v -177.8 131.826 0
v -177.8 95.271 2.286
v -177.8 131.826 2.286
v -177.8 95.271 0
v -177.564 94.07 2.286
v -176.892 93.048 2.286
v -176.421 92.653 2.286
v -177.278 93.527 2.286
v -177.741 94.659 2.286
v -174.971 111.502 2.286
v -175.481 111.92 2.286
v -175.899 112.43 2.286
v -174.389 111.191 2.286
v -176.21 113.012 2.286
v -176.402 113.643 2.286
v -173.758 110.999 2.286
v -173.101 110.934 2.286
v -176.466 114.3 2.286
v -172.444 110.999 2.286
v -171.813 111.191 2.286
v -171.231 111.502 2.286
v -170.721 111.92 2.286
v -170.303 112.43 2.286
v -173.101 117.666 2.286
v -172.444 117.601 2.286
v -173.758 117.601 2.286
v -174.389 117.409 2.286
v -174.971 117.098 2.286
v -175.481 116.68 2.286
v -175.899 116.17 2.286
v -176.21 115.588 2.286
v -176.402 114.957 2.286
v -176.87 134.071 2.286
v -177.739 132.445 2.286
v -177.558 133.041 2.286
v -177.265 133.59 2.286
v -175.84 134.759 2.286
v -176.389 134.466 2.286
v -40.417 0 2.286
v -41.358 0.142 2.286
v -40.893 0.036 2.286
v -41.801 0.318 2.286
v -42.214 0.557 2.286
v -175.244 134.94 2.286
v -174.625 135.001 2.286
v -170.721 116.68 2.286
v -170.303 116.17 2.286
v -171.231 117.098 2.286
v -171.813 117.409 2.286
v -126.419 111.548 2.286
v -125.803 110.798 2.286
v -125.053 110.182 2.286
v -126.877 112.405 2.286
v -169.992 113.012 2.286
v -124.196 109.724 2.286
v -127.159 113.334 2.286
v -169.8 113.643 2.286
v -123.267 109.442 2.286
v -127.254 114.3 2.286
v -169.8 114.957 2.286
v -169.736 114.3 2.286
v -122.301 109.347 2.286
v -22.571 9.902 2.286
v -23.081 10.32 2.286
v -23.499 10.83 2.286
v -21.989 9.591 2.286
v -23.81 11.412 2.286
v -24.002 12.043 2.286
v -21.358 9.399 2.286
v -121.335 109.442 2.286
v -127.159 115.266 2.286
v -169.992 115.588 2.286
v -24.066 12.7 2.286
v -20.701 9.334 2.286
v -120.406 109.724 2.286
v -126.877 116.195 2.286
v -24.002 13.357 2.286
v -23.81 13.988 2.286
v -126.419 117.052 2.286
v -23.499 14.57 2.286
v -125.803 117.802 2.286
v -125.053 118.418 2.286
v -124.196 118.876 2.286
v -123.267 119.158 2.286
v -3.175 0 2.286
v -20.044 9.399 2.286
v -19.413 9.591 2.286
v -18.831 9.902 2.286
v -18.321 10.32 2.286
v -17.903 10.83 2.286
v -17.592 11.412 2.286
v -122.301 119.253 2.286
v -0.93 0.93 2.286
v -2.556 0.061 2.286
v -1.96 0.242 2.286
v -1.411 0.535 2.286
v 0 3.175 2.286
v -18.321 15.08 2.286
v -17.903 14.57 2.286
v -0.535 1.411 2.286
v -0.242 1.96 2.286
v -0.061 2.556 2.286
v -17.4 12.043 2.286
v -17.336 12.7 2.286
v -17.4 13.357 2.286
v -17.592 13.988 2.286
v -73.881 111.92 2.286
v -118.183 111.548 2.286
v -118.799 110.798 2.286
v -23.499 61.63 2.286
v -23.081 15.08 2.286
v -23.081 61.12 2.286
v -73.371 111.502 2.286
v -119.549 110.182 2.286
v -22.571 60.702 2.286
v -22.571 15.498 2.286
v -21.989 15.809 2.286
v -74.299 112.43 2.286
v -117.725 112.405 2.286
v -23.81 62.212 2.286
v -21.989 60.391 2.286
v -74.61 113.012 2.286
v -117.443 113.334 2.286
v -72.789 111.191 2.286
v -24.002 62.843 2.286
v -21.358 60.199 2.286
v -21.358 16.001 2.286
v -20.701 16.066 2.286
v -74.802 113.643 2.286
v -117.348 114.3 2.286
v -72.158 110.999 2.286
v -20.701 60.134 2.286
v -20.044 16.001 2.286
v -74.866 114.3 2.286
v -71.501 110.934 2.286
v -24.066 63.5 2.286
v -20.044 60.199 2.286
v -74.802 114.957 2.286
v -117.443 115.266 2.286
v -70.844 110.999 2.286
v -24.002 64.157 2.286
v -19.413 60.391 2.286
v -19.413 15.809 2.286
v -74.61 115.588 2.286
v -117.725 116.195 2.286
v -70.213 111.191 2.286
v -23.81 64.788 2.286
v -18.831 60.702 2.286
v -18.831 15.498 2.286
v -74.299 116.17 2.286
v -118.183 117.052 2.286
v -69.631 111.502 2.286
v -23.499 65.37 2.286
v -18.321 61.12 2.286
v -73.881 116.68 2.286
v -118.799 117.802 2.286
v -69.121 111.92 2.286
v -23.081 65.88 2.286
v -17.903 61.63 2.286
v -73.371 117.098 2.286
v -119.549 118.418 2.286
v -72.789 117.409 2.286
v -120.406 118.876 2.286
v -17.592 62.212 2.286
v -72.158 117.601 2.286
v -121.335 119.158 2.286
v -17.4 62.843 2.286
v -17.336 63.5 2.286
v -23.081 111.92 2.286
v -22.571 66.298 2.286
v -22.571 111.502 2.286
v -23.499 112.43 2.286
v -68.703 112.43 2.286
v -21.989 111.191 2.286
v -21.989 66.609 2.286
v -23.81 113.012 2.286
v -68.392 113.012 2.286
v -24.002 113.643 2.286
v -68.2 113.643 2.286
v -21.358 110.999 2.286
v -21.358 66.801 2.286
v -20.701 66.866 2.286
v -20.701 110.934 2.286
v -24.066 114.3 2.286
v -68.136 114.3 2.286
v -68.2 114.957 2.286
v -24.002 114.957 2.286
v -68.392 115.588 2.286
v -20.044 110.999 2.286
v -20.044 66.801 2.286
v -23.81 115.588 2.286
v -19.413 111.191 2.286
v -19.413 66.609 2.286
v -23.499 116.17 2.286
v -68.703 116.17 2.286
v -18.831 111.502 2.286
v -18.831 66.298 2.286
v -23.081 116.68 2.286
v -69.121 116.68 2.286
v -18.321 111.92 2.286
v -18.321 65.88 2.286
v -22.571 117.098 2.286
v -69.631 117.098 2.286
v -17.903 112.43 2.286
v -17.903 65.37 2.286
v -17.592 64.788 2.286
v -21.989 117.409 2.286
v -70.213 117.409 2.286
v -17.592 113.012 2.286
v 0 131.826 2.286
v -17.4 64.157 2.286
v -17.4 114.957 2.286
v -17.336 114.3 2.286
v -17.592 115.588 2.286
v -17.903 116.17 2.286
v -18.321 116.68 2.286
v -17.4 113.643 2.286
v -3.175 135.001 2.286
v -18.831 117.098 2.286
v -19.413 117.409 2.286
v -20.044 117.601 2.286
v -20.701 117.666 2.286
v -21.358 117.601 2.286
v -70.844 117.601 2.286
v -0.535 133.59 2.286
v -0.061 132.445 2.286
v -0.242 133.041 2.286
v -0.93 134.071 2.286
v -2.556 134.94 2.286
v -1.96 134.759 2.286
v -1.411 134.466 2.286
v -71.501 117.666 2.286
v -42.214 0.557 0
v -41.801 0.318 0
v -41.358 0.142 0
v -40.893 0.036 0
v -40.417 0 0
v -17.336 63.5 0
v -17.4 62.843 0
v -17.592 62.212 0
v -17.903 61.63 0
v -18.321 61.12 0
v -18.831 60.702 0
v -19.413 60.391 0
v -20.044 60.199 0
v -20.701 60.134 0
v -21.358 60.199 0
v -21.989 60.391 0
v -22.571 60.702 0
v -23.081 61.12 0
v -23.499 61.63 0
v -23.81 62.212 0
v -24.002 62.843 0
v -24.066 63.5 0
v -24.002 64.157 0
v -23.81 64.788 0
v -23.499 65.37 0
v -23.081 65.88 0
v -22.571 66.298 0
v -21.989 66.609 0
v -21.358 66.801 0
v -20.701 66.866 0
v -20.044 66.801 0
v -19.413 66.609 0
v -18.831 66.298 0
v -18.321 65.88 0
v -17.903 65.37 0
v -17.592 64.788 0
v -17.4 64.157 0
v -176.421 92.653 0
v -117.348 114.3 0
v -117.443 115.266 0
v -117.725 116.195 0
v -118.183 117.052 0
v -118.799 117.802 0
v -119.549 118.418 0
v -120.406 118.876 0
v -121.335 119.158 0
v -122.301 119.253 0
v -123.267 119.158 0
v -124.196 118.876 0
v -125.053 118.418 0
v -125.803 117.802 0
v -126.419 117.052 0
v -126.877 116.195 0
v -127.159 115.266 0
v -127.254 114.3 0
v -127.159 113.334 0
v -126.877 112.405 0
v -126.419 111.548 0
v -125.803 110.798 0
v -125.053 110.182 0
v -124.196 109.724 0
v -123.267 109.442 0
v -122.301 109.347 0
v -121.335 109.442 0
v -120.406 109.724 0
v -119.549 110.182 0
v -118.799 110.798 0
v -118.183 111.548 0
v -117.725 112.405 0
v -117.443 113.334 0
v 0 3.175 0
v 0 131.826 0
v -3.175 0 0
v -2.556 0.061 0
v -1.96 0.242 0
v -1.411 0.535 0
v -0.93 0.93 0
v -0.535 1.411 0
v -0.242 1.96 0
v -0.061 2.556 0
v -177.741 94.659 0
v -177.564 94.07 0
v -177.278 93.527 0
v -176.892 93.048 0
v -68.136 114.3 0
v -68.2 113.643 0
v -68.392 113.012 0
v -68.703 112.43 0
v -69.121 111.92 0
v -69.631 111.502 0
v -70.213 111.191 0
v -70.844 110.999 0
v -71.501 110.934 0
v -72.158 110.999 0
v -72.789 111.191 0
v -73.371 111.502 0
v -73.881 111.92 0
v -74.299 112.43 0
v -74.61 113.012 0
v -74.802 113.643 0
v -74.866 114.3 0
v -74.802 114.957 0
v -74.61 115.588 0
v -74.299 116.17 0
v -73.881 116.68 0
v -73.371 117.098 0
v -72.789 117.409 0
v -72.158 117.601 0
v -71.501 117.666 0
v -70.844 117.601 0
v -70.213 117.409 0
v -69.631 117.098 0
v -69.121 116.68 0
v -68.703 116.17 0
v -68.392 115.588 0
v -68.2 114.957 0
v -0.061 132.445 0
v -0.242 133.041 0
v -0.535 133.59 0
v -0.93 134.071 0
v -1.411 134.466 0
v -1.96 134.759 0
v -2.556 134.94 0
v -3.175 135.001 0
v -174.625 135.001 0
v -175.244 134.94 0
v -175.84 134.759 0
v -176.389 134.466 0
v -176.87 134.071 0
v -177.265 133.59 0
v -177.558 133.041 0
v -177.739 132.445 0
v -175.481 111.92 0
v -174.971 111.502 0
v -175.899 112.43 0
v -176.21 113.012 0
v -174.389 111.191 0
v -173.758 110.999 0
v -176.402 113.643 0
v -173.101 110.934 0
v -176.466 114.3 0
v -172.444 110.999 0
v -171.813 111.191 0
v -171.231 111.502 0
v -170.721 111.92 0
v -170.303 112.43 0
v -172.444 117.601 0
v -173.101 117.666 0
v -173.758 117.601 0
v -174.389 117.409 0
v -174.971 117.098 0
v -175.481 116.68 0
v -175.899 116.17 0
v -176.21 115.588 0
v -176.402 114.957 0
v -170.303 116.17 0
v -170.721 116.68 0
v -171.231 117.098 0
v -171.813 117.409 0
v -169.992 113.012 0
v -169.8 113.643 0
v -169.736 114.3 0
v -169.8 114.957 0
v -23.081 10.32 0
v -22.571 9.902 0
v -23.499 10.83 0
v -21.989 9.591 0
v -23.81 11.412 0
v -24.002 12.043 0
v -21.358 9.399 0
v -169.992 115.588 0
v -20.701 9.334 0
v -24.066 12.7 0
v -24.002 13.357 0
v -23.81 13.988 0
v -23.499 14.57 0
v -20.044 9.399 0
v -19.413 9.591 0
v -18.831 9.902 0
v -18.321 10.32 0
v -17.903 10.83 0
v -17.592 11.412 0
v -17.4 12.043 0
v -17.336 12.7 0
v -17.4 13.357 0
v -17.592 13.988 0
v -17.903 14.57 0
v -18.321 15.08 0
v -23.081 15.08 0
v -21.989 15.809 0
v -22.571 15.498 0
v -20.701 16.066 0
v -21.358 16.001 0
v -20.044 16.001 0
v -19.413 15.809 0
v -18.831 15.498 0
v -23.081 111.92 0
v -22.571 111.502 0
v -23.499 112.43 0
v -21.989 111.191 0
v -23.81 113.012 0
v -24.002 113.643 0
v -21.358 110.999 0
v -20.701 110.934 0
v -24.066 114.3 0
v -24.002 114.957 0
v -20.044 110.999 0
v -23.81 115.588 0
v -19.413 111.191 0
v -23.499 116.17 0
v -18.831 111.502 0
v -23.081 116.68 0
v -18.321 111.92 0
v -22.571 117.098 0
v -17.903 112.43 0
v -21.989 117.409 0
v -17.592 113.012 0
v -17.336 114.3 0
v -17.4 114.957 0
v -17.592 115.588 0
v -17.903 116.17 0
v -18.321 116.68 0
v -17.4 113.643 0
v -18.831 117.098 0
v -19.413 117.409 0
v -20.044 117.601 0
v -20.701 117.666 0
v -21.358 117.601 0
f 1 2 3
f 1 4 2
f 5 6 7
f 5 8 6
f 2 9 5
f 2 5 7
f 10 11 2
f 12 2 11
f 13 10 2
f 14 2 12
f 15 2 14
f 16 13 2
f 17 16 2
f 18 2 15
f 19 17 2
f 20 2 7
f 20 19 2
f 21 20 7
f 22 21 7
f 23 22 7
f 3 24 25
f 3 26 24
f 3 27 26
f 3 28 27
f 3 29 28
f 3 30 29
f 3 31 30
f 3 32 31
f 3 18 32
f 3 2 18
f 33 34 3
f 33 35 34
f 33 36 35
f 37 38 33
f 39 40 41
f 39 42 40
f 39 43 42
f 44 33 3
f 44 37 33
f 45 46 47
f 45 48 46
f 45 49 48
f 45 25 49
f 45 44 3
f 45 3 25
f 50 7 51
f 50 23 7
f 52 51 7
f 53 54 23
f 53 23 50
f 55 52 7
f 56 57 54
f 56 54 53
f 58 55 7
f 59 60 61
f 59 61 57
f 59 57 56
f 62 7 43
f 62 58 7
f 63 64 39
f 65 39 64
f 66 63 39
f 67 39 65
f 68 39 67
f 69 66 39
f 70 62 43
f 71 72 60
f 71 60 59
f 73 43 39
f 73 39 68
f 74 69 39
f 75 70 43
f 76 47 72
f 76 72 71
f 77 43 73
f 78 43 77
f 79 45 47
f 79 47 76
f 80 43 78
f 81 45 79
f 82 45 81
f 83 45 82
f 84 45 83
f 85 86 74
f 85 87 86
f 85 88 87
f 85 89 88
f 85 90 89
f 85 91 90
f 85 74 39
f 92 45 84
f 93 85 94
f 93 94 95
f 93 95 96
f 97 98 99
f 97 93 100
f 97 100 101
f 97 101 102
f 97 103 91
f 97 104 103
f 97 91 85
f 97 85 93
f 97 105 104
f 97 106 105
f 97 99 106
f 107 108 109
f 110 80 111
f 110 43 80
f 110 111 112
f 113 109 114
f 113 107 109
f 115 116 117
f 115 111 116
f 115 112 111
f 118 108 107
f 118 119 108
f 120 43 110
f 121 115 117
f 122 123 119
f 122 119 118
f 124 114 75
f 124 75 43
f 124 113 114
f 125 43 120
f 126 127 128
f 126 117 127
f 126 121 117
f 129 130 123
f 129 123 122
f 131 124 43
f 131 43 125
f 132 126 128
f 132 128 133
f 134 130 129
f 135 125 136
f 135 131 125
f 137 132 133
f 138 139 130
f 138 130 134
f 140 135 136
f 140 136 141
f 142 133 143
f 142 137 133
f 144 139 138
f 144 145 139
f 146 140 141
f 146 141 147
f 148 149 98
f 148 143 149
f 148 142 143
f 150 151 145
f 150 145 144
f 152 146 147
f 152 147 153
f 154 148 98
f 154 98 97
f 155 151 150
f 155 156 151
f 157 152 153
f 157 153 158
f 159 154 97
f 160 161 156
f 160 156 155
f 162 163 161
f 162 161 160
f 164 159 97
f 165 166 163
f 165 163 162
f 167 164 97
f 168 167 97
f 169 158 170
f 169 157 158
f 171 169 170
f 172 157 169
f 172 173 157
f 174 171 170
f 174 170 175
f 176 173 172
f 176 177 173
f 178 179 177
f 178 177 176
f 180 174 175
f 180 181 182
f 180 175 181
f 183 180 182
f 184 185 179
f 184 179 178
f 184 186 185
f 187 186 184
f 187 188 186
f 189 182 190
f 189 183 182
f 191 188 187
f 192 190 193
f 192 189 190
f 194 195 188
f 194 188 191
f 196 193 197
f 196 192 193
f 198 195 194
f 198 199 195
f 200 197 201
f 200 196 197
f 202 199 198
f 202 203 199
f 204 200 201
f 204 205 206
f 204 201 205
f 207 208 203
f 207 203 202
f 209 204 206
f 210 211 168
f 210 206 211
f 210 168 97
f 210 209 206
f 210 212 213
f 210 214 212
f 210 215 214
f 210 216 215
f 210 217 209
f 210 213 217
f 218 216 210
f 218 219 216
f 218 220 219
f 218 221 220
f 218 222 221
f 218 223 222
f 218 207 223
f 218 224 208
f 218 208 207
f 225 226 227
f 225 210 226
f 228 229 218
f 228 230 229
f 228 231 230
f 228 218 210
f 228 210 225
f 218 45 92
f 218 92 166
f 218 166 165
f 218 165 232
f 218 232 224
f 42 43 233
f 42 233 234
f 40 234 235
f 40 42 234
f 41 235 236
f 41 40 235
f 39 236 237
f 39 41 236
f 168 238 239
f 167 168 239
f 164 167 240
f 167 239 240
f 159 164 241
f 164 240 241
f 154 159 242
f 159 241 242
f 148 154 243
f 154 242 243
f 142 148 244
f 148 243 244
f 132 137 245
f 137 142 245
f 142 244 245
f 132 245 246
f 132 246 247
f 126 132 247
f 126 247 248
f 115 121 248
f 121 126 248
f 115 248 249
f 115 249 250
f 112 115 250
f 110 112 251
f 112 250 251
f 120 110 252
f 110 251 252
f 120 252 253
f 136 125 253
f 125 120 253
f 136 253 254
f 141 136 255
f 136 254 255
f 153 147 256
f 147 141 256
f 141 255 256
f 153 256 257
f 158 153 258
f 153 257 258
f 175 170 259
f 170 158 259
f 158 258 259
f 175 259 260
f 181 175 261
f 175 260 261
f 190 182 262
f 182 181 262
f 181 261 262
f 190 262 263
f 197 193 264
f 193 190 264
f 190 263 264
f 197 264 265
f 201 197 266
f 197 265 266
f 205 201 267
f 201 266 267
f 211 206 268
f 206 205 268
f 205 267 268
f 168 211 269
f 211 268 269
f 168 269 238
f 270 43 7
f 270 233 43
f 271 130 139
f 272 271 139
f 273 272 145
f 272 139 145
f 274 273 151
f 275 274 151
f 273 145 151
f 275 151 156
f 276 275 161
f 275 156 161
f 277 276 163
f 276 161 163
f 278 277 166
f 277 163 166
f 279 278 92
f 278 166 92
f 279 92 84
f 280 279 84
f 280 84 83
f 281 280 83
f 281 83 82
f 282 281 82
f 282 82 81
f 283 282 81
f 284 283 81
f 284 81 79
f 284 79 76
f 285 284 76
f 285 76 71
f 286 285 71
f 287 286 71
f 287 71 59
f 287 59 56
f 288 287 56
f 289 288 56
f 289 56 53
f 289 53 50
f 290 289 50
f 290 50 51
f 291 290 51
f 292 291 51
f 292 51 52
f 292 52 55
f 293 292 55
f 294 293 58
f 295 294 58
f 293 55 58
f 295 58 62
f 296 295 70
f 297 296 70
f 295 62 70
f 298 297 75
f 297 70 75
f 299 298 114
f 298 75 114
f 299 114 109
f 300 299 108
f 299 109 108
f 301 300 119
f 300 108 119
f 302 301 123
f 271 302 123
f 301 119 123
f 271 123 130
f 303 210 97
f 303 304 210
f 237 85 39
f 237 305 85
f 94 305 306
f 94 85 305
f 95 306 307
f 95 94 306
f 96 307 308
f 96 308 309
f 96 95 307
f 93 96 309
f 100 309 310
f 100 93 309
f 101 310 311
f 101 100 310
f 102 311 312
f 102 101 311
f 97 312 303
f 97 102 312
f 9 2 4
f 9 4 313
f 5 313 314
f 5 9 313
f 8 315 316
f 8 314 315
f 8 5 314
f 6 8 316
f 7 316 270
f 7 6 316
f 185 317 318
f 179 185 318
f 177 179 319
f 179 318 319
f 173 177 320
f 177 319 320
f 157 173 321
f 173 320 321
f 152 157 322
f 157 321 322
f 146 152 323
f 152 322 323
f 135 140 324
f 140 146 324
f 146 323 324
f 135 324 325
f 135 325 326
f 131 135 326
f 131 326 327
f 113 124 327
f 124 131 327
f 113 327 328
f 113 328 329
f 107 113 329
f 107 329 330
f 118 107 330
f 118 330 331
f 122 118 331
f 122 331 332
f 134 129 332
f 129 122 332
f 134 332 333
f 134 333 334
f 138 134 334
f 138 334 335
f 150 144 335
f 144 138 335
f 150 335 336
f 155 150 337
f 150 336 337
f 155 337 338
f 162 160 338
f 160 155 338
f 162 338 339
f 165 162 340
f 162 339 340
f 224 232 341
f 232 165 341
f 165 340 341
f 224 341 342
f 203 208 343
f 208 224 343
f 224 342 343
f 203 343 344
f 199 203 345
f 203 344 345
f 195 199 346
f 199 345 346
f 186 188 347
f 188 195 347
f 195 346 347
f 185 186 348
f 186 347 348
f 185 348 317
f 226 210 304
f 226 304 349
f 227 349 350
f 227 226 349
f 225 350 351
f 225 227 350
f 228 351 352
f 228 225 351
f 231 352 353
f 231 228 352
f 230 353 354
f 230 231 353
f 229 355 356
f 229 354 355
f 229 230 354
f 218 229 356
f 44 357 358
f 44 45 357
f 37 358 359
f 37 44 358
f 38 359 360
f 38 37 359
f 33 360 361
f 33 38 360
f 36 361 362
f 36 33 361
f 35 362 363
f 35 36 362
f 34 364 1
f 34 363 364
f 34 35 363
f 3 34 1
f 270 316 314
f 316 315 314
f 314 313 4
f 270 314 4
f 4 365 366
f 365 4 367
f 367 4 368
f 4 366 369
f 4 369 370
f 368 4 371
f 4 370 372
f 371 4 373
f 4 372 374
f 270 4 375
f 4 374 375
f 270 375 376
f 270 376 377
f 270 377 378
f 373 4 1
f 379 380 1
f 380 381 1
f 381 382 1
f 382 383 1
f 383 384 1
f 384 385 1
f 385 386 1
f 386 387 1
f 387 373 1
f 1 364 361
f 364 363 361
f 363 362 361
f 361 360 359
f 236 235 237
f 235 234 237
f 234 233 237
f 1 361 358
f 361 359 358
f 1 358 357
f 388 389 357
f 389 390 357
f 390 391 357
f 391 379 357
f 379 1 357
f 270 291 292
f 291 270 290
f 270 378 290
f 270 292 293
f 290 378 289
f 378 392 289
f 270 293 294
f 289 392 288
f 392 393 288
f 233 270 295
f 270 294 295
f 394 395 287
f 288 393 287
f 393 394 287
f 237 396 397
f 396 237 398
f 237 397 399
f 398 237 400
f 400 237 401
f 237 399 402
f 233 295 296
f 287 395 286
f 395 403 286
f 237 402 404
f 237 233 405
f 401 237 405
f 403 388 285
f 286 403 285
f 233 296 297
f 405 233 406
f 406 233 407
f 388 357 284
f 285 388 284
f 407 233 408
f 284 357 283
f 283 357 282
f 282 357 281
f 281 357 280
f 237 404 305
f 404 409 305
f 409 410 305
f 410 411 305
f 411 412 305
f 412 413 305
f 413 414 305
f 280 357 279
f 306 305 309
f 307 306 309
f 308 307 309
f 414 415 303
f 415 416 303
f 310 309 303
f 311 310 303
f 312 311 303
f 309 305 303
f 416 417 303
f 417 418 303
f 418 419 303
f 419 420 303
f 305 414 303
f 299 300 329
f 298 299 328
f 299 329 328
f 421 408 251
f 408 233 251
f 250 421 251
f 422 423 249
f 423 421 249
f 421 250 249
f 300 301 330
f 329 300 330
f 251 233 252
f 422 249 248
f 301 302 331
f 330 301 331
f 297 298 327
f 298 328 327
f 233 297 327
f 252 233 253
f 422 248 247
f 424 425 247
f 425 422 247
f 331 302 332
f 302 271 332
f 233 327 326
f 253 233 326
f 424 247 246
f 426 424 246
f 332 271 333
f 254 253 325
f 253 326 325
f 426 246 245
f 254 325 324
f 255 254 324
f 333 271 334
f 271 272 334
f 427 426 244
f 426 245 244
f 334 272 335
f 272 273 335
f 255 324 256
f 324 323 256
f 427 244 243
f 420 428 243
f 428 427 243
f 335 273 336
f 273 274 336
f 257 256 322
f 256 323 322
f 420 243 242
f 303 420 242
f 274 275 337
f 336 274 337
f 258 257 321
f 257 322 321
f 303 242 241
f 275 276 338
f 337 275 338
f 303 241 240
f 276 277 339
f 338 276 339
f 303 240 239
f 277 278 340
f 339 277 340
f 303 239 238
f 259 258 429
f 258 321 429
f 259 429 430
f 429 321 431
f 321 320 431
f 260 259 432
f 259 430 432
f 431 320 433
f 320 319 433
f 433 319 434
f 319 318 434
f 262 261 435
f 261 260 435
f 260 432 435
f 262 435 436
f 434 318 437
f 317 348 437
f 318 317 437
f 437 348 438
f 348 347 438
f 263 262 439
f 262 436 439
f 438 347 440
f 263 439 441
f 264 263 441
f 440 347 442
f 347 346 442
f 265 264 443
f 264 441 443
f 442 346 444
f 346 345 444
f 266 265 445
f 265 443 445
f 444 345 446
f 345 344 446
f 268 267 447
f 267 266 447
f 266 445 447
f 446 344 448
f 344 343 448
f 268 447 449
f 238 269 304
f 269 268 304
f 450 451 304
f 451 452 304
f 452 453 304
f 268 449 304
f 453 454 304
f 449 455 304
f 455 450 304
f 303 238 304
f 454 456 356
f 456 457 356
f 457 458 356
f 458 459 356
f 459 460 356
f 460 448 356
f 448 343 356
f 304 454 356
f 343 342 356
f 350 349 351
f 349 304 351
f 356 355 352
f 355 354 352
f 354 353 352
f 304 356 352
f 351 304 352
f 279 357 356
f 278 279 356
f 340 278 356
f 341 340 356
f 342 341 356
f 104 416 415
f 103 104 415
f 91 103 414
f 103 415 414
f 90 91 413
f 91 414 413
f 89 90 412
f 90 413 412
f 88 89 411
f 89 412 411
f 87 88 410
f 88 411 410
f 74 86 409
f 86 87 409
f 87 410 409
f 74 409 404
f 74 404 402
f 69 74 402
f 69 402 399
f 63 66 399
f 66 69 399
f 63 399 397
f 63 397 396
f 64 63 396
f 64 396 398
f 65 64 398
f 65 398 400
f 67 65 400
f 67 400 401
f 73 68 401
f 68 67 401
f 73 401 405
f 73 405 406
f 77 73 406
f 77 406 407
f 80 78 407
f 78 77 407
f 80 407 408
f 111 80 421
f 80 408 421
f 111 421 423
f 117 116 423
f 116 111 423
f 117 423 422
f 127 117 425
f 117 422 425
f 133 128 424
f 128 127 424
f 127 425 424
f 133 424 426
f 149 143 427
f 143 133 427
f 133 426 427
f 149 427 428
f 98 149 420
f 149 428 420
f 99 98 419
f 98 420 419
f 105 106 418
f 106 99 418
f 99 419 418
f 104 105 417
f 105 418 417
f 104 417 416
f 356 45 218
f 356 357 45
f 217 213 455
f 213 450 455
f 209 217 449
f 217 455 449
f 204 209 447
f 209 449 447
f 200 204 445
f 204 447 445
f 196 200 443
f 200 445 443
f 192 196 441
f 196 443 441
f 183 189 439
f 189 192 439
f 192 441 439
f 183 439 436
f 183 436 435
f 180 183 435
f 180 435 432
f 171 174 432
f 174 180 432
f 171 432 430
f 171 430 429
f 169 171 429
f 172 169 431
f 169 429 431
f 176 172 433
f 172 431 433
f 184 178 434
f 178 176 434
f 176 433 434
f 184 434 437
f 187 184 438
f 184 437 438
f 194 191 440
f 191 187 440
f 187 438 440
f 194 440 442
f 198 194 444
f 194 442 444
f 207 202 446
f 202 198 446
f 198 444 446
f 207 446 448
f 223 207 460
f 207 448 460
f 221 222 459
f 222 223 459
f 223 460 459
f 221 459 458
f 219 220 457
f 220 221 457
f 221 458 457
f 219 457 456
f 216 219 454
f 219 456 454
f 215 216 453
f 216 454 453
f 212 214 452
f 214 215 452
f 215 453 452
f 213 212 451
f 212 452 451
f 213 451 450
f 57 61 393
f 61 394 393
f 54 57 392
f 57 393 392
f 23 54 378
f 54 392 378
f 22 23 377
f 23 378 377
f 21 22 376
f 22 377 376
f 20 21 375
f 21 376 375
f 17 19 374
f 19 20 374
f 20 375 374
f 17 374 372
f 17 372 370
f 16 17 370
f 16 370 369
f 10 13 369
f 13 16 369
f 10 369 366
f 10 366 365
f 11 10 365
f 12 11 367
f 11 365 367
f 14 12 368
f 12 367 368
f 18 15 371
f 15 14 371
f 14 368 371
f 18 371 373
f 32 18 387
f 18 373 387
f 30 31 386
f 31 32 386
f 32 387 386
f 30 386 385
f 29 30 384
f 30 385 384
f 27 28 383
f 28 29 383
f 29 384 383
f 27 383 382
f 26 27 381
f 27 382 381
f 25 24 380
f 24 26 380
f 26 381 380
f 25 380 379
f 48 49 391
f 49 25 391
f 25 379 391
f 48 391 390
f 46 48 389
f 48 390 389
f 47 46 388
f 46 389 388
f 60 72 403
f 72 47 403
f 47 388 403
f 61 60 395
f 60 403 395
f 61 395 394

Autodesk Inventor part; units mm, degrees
ref_plane "YZ Plane" through (0, 0, 0) normal (1, 0, 0) x (0, 1, 0)
ref_plane "XZ Plane" through (0, 0, 0) normal (0, 1, 0) x (-1, 0, 0)
ref_plane "XY Plane" through (0, 0, 0) normal (0, 0, 1) x (1, 0, 0)
sketch "Sketch1" plane through (0, 0, 0) normal (0, 0, 1) x (1, 0, 0)
  line L0 (0, 0) -> (-41.402, 0)
  line L1 (-41.402, 0) -> (-177.8, 93.599)
  line L2 (-177.8, 93.599) -> (-177.8, 135.001)
  line L3 (-177.8, 135.001) -> (0, 135.001)
  line L4 (0, 135.001) -> (0, 0)
  circle A0 centre (-20.701, 12.7) radius 3.3655
  circle A1 centre (-20.701, 63.5) radius 3.3655
  circle A2 centre (-20.701, 114.3) radius 3.3655
  circle A3 centre (-71.501, 114.3) radius 3.3655
  circle A4 centre (-122.301, 114.3) radius 3.3655
  circle A5 centre (-173.101, 114.3) radius 3.3655
  dimension "d0" = 41.402
  dimension "d1" = 41.402
  dimension "d2" = 177.8
  dimension "d3" = 135.001
  dimension "d4" = 6.731
  dimension "d6" = 20.701
  dimension "d9" = 50.8
  dimension "d14" = 20.701
  dimension "d15" = 20.701
  dimension "d16" = 50.8
  dimension "d17" = 12.7
  dimension "d20" = 50.8
  dimension "d25" = 4.699
extrude "Extrusion1" add sketch "Sketch1" along normal blind 2.286
fillet "Fillet1" radius 3.175 5 edges at (0, 135.001, 1.143) (0, 0, 1.143) (-41.402, 0, 1.143) (-177.8, 93.599, 1.143) (-177.8, 135.001, 1.143)
sketch "Sketch2" plane through (0, 0, 2.286) normal (0, 0, 1) x (1, 0, 0)
  circle A0 centre (-122.301, 114.3) radius 3.3655 construction
  circle A1 centre (-122.301, 114.3) radius 4.953
  point P0 (0, 0)
  dimension "d29" = 1.5875
extrude "Extrusion2" cut sketch "Sketch2" against normal through all
properties part number "Corner-Tower-Brace Upper" material "Aluminum 6061"
